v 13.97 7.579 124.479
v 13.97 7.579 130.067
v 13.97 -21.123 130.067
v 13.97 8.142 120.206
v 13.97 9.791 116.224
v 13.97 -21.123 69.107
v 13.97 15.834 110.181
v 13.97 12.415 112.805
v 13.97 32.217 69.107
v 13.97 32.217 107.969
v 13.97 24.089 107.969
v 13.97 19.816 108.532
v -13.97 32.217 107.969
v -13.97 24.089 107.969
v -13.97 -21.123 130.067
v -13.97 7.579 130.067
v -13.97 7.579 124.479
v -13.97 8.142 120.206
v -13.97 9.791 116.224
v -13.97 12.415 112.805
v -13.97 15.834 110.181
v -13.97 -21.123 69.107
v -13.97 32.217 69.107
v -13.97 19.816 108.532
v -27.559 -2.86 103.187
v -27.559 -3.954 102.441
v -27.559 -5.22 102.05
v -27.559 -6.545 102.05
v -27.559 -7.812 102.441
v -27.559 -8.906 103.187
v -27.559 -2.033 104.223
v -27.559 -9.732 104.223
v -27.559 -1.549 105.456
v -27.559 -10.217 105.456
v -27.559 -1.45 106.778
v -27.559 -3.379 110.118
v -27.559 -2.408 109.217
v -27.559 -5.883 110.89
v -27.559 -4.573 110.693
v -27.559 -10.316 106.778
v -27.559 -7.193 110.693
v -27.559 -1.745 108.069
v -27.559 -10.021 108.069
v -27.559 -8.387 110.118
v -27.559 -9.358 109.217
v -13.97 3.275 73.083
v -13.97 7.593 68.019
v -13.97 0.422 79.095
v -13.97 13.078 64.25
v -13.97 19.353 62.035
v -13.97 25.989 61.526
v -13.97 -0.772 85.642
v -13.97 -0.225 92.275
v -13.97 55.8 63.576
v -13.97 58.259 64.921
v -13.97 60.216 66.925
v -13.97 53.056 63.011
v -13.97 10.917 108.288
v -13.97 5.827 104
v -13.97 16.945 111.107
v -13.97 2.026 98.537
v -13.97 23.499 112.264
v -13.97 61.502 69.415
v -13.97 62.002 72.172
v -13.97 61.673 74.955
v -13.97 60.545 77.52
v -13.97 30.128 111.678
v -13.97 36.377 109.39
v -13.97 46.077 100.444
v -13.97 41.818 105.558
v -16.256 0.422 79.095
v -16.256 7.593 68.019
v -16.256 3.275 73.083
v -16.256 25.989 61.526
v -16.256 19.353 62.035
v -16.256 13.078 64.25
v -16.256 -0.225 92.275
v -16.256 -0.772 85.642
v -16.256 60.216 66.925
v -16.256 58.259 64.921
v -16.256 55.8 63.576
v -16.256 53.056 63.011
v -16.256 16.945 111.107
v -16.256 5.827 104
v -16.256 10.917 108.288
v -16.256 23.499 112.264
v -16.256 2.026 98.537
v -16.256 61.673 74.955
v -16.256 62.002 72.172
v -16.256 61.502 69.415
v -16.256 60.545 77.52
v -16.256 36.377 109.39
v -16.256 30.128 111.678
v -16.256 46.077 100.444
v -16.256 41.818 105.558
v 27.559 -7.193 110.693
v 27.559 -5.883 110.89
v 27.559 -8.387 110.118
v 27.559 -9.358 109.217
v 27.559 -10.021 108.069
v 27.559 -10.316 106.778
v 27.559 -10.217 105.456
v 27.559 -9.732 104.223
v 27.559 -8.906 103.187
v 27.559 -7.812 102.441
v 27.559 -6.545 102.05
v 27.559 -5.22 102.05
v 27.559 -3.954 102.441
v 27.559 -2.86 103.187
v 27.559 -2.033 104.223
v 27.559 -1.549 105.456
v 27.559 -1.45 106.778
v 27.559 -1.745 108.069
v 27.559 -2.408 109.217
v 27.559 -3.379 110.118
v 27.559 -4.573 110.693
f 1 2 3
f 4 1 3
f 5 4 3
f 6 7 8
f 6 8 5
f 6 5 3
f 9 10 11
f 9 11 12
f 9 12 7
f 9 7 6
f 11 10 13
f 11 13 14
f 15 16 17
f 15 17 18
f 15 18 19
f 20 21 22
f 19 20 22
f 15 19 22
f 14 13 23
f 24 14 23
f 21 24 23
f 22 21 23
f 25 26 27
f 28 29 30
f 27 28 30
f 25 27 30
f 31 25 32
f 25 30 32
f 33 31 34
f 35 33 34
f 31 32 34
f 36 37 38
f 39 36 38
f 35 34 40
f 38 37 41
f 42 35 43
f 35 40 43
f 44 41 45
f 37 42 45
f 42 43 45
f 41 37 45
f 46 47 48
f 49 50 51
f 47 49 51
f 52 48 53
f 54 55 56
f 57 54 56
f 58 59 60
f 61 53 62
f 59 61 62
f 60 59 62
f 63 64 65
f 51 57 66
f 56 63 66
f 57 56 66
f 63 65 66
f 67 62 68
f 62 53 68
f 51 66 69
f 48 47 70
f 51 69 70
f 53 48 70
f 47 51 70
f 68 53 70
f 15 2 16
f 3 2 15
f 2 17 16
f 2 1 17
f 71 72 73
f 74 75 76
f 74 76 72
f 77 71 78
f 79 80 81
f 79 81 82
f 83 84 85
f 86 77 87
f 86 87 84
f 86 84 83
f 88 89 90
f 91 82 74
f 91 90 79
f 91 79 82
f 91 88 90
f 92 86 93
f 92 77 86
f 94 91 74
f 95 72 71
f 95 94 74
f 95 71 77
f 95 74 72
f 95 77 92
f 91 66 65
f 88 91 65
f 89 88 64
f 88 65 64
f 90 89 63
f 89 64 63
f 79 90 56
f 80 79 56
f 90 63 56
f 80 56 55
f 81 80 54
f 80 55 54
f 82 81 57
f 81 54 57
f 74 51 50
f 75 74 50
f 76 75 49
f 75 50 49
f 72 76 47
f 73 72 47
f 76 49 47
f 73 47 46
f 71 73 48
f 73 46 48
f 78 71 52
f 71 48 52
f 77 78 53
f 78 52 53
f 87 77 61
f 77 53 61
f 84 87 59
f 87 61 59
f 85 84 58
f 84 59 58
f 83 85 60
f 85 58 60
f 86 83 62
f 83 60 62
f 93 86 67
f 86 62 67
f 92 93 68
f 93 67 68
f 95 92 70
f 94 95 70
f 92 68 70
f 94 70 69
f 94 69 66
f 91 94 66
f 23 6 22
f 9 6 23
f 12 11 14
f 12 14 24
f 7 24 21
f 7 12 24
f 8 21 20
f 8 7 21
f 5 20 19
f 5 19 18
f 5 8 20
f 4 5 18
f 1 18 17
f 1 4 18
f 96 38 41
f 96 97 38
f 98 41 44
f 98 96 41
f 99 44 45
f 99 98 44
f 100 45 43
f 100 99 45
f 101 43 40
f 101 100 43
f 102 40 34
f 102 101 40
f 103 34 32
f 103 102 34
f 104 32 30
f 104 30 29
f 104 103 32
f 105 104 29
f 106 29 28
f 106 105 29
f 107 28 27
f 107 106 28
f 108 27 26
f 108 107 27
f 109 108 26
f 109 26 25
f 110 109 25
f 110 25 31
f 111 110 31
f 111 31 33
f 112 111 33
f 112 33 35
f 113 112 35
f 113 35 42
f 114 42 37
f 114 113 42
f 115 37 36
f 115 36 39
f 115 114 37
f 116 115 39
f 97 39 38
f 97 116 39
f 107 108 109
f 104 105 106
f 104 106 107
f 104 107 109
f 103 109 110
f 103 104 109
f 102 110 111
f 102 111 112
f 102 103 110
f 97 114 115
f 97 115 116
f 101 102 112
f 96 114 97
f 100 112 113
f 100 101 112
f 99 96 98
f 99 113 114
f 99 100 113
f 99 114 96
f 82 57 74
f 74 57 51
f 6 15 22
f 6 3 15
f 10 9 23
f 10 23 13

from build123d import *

# Parameters (mm, degrees)
EXTRUDE1_DEPTH = 13.97
SKETCH2_R      = 4.445
EXTRUDE2_DEPTH = 27.559
EXTRUDE3_DEPTH = 2.286


with BuildPart() as part:
    # Sketch1 → Extrude1 (new, symmetric)
    with BuildSketch(Plane(origin=(0, 0, 0), x_dir=(0, 0, -1), z_dir=(1, 0, 0))):
        with BuildLine():
            Line((-130.067375666, -21.122959685), (-69.107375666, -21.122959685))
            Line((-69.107375666, -21.122959685), (-69.107375666, 32.217040315))
            Line((-69.107375666, 32.217040315), (-107.969375666, 32.217040315))
            Line((-107.969375666, 32.217040315), (-107.969375666, 24.089040315))
            ThreePointArc((-107.969375666, 24.089040315), (-112.805042709, 12.414707357), (-124.479375666, 7.579040315))
            Line((-124.479375666, 7.579040315), (-130.067375666, 7.579040315))
            Line((-130.067375666, 7.579040315), (-130.067375666, -21.122959685))
        make_face()
    extrude(amount=EXTRUDE1_DEPTH, both=True)


with BuildPart() as body_2:
    # Sketch2 → Extrude2 (new, symmetric)
    with BuildSketch(Plane(origin=(0, 0, 0), x_dir=(0, 0, -1), z_dir=(1, 0, 0))):
        with Locations(Location((-106.445375666, -5.882959685, 0), (0, 0, 180))):
            Circle(SKETCH2_R)
    extrude(amount=EXTRUDE2_DEPTH, both=True)


with BuildPart() as body_3:
    # Sketch3 → Extrude3 (new body)
    with BuildSketch(Plane.ZY.offset(13.97)):
        with BuildLine():
            Line((63.010638923, 53.055826512), (61.525522421, 25.988586197))
            ThreePointArc((61.525522421, 25.988586197), (98.53745862, 2.026360946), (100.44400064, 46.076749794))
            Line((100.44400064, 46.076749794), (77.519948018, 60.544952195))
            ThreePointArc((77.519948018, 60.544952195), (68.122563195, 60.951679798), (63.010638923, 53.055826512))
        make_face()
    extrude(amount=EXTRUDE3_DEPTH)


solid = Compound([part.part, body_2.part, body_3.part])
